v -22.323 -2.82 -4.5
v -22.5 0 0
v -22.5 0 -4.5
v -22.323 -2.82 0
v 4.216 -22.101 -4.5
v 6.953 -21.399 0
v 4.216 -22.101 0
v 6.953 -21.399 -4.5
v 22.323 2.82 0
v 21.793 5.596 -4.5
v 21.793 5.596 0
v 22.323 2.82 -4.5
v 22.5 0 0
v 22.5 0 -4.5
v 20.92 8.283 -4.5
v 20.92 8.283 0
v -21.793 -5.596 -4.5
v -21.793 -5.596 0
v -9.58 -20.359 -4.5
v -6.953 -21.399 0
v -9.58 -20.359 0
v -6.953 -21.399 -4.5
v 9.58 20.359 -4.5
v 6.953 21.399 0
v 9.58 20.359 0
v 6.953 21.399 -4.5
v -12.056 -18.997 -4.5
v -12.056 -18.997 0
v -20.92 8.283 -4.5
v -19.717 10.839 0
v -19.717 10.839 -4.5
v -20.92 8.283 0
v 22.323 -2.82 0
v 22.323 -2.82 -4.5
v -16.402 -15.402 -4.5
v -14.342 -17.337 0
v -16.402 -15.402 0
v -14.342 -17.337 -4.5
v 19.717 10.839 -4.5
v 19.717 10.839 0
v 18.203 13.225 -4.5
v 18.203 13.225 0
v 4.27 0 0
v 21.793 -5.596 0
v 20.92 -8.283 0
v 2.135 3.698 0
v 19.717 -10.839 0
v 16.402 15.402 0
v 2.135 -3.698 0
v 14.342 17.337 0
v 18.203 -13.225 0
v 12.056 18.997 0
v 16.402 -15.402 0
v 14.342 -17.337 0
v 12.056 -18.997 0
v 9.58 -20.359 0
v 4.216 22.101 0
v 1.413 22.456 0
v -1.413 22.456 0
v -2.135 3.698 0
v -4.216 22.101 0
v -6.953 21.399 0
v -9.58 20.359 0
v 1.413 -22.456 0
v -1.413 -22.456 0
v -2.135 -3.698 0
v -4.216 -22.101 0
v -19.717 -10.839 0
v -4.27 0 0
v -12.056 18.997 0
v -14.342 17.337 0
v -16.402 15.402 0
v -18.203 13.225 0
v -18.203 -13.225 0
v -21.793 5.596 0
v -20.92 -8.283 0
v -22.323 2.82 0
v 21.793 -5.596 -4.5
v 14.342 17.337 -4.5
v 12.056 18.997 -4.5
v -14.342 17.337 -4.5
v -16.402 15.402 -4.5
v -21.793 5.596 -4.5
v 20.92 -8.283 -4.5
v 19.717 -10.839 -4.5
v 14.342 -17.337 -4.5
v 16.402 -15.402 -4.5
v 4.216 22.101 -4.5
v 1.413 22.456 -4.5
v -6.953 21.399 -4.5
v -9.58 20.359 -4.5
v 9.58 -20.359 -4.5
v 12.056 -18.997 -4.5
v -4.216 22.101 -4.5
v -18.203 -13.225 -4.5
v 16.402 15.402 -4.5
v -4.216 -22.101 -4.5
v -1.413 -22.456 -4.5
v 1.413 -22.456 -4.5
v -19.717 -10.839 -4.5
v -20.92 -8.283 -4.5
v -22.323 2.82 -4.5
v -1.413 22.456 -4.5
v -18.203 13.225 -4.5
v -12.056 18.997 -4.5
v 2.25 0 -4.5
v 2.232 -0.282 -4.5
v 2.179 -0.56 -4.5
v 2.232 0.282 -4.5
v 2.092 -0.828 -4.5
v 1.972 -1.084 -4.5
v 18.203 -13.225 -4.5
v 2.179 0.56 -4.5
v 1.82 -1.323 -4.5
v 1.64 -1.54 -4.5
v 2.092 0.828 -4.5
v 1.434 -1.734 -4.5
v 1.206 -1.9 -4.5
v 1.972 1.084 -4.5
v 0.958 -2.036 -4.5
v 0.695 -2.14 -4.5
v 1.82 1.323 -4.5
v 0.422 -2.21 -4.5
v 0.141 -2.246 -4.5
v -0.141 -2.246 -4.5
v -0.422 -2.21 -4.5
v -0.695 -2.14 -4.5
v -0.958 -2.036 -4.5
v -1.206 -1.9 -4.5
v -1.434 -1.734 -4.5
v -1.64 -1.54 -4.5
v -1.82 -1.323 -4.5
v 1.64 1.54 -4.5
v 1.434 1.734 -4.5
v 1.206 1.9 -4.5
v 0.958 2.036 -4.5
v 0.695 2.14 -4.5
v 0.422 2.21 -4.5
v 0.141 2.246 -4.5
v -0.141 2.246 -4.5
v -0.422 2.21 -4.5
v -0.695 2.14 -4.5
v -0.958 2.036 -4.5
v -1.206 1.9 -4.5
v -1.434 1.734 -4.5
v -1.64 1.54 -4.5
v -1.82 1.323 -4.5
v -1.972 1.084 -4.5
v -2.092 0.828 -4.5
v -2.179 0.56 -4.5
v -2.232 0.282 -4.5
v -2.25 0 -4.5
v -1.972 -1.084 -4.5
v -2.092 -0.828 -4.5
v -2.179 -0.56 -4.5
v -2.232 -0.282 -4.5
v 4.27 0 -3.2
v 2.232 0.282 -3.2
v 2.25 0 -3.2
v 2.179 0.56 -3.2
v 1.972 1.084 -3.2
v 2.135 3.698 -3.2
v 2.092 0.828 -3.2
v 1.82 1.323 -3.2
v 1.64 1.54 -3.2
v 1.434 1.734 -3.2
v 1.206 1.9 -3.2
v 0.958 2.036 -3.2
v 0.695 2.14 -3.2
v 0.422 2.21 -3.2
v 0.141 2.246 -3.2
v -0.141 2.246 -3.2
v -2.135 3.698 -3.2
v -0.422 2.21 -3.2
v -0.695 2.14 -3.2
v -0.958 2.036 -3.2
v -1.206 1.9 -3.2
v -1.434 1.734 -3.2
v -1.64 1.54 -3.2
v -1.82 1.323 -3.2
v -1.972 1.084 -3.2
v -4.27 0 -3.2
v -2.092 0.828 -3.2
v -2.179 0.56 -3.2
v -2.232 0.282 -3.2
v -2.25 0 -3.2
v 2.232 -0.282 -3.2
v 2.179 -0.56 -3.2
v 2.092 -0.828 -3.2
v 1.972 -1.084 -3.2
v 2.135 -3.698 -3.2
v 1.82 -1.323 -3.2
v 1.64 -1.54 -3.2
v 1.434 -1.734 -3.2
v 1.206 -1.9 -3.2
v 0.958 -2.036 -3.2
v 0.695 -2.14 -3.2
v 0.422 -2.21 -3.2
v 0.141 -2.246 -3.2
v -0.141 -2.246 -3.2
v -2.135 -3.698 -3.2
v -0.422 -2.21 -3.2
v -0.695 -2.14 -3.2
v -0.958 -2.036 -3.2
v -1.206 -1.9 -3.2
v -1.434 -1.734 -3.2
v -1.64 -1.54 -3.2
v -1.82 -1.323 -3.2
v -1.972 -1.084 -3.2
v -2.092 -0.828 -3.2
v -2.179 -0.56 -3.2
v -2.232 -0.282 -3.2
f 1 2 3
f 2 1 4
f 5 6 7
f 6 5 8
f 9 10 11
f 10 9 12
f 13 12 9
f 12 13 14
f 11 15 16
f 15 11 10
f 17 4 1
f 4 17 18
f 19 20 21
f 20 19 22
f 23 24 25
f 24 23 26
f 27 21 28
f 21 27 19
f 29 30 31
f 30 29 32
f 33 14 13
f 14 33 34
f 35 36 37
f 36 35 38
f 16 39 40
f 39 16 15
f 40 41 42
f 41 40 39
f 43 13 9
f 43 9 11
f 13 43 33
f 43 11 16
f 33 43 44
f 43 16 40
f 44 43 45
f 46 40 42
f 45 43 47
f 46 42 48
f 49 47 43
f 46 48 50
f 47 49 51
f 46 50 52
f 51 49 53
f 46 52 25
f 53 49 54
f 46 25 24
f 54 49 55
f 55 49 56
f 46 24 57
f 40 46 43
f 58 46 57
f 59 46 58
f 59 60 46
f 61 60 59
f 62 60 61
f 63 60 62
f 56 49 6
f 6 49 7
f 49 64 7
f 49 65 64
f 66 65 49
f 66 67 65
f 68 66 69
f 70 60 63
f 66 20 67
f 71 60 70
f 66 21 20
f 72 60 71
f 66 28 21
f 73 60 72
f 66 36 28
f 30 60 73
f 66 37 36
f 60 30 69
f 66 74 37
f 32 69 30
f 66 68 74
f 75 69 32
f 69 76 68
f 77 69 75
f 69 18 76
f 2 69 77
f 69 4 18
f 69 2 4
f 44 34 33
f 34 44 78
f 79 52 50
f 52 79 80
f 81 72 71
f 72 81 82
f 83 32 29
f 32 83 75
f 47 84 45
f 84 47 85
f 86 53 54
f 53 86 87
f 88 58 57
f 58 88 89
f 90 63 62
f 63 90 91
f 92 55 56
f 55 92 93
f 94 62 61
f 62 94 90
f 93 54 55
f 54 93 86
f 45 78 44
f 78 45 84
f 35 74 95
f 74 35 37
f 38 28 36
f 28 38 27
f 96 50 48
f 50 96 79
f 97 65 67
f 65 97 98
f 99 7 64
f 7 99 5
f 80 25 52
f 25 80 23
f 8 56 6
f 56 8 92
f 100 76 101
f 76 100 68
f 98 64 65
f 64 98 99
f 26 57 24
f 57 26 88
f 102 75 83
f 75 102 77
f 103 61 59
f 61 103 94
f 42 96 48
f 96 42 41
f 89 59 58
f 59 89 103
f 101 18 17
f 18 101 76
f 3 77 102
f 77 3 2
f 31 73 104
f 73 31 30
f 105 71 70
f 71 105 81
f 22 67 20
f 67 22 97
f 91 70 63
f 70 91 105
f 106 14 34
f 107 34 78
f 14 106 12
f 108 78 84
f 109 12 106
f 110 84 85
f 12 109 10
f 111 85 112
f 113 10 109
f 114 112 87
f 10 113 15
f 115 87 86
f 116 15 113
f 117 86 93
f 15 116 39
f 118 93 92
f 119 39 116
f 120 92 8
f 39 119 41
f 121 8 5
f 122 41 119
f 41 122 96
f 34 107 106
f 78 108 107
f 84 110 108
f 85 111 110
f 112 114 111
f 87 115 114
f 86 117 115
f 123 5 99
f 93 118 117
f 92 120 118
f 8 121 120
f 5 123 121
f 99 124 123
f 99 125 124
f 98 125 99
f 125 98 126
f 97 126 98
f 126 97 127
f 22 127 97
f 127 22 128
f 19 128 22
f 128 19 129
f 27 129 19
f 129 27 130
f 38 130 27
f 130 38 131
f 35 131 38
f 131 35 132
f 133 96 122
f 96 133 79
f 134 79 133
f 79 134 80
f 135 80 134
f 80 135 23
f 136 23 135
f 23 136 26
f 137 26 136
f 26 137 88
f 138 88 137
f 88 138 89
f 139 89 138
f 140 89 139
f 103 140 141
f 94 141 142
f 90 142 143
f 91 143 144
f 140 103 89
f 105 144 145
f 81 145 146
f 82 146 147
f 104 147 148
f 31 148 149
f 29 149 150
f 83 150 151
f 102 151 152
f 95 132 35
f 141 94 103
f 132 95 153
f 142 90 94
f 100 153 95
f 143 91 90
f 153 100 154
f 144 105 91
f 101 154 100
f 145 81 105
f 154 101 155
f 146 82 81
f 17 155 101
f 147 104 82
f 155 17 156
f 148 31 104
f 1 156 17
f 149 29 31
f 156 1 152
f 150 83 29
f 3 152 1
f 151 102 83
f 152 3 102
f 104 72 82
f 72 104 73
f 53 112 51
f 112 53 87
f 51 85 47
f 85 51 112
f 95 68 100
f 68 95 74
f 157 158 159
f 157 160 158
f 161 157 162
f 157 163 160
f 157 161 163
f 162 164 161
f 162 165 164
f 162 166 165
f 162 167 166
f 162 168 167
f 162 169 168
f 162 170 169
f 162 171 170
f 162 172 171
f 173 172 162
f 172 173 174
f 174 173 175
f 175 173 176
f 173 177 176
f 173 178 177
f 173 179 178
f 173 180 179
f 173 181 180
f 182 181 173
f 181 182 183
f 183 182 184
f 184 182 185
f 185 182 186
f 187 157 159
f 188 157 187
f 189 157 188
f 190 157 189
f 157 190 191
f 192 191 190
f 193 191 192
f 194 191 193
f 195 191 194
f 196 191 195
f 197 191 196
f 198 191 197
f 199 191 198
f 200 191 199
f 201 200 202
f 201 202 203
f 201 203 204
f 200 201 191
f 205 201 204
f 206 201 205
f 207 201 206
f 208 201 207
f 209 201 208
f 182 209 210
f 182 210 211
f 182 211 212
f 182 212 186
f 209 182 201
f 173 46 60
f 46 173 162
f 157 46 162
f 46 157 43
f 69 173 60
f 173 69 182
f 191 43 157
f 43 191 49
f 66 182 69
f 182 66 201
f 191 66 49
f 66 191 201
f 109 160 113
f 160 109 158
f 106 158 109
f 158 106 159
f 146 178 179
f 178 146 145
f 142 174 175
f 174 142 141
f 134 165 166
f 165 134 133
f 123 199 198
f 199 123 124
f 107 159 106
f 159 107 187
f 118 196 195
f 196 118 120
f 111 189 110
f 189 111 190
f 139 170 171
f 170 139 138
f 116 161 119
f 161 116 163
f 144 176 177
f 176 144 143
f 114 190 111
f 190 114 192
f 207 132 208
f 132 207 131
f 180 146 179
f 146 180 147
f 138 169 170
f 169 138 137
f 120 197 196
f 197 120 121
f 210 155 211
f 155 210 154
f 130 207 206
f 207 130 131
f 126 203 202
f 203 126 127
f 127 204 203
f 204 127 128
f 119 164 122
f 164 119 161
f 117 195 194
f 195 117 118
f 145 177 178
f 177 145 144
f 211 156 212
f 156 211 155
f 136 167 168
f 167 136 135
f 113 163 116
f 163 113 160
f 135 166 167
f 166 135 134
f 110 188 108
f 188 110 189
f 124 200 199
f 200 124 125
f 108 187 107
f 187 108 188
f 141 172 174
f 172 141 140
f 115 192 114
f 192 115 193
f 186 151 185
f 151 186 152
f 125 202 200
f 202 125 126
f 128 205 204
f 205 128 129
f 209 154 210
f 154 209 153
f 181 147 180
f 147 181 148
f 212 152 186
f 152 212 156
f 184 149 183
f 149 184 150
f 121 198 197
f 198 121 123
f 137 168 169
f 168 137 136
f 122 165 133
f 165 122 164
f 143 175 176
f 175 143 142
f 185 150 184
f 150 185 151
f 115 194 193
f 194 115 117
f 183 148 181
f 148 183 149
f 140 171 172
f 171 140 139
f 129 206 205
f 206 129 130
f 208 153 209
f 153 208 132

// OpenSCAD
$fn = 50;


difference() {
	union() {
		translate(v = [0, 0, -4.5000000000]) {
			cylinder(h = 4.5000000000, r = 22.5000000000);
		}
		translate(v = [0, 0, -3.0000000000]) {
			cylinder(h = 3, r = 2.8750000000);
		}
	}
	union() {
		translate(v = [0, 0, 0]) {
			rotate(a = [0, 0, 0]) {
				difference() {
					union() {
						translate(v = [0, 0, -3.2000000000]) {
							linear_extrude(height = 3.2000000000) {
								polygon(points = [[4.2698000000, 0.0000000000], [2.1349000000, 3.6977552691], [-2.1349000000, 3.6977552691], [-4.2698000000, 0.0000000000], [-2.1349000000, -3.6977552691], [2.1349000000, -3.6977552691]]);
							}
						}
					}
					union();
				}
			}
		}
		#translate(v = [0, 0, -100.0000000000]) {
			cylinder(h = 200, r = 2.2500000000);
		}
	}
}
